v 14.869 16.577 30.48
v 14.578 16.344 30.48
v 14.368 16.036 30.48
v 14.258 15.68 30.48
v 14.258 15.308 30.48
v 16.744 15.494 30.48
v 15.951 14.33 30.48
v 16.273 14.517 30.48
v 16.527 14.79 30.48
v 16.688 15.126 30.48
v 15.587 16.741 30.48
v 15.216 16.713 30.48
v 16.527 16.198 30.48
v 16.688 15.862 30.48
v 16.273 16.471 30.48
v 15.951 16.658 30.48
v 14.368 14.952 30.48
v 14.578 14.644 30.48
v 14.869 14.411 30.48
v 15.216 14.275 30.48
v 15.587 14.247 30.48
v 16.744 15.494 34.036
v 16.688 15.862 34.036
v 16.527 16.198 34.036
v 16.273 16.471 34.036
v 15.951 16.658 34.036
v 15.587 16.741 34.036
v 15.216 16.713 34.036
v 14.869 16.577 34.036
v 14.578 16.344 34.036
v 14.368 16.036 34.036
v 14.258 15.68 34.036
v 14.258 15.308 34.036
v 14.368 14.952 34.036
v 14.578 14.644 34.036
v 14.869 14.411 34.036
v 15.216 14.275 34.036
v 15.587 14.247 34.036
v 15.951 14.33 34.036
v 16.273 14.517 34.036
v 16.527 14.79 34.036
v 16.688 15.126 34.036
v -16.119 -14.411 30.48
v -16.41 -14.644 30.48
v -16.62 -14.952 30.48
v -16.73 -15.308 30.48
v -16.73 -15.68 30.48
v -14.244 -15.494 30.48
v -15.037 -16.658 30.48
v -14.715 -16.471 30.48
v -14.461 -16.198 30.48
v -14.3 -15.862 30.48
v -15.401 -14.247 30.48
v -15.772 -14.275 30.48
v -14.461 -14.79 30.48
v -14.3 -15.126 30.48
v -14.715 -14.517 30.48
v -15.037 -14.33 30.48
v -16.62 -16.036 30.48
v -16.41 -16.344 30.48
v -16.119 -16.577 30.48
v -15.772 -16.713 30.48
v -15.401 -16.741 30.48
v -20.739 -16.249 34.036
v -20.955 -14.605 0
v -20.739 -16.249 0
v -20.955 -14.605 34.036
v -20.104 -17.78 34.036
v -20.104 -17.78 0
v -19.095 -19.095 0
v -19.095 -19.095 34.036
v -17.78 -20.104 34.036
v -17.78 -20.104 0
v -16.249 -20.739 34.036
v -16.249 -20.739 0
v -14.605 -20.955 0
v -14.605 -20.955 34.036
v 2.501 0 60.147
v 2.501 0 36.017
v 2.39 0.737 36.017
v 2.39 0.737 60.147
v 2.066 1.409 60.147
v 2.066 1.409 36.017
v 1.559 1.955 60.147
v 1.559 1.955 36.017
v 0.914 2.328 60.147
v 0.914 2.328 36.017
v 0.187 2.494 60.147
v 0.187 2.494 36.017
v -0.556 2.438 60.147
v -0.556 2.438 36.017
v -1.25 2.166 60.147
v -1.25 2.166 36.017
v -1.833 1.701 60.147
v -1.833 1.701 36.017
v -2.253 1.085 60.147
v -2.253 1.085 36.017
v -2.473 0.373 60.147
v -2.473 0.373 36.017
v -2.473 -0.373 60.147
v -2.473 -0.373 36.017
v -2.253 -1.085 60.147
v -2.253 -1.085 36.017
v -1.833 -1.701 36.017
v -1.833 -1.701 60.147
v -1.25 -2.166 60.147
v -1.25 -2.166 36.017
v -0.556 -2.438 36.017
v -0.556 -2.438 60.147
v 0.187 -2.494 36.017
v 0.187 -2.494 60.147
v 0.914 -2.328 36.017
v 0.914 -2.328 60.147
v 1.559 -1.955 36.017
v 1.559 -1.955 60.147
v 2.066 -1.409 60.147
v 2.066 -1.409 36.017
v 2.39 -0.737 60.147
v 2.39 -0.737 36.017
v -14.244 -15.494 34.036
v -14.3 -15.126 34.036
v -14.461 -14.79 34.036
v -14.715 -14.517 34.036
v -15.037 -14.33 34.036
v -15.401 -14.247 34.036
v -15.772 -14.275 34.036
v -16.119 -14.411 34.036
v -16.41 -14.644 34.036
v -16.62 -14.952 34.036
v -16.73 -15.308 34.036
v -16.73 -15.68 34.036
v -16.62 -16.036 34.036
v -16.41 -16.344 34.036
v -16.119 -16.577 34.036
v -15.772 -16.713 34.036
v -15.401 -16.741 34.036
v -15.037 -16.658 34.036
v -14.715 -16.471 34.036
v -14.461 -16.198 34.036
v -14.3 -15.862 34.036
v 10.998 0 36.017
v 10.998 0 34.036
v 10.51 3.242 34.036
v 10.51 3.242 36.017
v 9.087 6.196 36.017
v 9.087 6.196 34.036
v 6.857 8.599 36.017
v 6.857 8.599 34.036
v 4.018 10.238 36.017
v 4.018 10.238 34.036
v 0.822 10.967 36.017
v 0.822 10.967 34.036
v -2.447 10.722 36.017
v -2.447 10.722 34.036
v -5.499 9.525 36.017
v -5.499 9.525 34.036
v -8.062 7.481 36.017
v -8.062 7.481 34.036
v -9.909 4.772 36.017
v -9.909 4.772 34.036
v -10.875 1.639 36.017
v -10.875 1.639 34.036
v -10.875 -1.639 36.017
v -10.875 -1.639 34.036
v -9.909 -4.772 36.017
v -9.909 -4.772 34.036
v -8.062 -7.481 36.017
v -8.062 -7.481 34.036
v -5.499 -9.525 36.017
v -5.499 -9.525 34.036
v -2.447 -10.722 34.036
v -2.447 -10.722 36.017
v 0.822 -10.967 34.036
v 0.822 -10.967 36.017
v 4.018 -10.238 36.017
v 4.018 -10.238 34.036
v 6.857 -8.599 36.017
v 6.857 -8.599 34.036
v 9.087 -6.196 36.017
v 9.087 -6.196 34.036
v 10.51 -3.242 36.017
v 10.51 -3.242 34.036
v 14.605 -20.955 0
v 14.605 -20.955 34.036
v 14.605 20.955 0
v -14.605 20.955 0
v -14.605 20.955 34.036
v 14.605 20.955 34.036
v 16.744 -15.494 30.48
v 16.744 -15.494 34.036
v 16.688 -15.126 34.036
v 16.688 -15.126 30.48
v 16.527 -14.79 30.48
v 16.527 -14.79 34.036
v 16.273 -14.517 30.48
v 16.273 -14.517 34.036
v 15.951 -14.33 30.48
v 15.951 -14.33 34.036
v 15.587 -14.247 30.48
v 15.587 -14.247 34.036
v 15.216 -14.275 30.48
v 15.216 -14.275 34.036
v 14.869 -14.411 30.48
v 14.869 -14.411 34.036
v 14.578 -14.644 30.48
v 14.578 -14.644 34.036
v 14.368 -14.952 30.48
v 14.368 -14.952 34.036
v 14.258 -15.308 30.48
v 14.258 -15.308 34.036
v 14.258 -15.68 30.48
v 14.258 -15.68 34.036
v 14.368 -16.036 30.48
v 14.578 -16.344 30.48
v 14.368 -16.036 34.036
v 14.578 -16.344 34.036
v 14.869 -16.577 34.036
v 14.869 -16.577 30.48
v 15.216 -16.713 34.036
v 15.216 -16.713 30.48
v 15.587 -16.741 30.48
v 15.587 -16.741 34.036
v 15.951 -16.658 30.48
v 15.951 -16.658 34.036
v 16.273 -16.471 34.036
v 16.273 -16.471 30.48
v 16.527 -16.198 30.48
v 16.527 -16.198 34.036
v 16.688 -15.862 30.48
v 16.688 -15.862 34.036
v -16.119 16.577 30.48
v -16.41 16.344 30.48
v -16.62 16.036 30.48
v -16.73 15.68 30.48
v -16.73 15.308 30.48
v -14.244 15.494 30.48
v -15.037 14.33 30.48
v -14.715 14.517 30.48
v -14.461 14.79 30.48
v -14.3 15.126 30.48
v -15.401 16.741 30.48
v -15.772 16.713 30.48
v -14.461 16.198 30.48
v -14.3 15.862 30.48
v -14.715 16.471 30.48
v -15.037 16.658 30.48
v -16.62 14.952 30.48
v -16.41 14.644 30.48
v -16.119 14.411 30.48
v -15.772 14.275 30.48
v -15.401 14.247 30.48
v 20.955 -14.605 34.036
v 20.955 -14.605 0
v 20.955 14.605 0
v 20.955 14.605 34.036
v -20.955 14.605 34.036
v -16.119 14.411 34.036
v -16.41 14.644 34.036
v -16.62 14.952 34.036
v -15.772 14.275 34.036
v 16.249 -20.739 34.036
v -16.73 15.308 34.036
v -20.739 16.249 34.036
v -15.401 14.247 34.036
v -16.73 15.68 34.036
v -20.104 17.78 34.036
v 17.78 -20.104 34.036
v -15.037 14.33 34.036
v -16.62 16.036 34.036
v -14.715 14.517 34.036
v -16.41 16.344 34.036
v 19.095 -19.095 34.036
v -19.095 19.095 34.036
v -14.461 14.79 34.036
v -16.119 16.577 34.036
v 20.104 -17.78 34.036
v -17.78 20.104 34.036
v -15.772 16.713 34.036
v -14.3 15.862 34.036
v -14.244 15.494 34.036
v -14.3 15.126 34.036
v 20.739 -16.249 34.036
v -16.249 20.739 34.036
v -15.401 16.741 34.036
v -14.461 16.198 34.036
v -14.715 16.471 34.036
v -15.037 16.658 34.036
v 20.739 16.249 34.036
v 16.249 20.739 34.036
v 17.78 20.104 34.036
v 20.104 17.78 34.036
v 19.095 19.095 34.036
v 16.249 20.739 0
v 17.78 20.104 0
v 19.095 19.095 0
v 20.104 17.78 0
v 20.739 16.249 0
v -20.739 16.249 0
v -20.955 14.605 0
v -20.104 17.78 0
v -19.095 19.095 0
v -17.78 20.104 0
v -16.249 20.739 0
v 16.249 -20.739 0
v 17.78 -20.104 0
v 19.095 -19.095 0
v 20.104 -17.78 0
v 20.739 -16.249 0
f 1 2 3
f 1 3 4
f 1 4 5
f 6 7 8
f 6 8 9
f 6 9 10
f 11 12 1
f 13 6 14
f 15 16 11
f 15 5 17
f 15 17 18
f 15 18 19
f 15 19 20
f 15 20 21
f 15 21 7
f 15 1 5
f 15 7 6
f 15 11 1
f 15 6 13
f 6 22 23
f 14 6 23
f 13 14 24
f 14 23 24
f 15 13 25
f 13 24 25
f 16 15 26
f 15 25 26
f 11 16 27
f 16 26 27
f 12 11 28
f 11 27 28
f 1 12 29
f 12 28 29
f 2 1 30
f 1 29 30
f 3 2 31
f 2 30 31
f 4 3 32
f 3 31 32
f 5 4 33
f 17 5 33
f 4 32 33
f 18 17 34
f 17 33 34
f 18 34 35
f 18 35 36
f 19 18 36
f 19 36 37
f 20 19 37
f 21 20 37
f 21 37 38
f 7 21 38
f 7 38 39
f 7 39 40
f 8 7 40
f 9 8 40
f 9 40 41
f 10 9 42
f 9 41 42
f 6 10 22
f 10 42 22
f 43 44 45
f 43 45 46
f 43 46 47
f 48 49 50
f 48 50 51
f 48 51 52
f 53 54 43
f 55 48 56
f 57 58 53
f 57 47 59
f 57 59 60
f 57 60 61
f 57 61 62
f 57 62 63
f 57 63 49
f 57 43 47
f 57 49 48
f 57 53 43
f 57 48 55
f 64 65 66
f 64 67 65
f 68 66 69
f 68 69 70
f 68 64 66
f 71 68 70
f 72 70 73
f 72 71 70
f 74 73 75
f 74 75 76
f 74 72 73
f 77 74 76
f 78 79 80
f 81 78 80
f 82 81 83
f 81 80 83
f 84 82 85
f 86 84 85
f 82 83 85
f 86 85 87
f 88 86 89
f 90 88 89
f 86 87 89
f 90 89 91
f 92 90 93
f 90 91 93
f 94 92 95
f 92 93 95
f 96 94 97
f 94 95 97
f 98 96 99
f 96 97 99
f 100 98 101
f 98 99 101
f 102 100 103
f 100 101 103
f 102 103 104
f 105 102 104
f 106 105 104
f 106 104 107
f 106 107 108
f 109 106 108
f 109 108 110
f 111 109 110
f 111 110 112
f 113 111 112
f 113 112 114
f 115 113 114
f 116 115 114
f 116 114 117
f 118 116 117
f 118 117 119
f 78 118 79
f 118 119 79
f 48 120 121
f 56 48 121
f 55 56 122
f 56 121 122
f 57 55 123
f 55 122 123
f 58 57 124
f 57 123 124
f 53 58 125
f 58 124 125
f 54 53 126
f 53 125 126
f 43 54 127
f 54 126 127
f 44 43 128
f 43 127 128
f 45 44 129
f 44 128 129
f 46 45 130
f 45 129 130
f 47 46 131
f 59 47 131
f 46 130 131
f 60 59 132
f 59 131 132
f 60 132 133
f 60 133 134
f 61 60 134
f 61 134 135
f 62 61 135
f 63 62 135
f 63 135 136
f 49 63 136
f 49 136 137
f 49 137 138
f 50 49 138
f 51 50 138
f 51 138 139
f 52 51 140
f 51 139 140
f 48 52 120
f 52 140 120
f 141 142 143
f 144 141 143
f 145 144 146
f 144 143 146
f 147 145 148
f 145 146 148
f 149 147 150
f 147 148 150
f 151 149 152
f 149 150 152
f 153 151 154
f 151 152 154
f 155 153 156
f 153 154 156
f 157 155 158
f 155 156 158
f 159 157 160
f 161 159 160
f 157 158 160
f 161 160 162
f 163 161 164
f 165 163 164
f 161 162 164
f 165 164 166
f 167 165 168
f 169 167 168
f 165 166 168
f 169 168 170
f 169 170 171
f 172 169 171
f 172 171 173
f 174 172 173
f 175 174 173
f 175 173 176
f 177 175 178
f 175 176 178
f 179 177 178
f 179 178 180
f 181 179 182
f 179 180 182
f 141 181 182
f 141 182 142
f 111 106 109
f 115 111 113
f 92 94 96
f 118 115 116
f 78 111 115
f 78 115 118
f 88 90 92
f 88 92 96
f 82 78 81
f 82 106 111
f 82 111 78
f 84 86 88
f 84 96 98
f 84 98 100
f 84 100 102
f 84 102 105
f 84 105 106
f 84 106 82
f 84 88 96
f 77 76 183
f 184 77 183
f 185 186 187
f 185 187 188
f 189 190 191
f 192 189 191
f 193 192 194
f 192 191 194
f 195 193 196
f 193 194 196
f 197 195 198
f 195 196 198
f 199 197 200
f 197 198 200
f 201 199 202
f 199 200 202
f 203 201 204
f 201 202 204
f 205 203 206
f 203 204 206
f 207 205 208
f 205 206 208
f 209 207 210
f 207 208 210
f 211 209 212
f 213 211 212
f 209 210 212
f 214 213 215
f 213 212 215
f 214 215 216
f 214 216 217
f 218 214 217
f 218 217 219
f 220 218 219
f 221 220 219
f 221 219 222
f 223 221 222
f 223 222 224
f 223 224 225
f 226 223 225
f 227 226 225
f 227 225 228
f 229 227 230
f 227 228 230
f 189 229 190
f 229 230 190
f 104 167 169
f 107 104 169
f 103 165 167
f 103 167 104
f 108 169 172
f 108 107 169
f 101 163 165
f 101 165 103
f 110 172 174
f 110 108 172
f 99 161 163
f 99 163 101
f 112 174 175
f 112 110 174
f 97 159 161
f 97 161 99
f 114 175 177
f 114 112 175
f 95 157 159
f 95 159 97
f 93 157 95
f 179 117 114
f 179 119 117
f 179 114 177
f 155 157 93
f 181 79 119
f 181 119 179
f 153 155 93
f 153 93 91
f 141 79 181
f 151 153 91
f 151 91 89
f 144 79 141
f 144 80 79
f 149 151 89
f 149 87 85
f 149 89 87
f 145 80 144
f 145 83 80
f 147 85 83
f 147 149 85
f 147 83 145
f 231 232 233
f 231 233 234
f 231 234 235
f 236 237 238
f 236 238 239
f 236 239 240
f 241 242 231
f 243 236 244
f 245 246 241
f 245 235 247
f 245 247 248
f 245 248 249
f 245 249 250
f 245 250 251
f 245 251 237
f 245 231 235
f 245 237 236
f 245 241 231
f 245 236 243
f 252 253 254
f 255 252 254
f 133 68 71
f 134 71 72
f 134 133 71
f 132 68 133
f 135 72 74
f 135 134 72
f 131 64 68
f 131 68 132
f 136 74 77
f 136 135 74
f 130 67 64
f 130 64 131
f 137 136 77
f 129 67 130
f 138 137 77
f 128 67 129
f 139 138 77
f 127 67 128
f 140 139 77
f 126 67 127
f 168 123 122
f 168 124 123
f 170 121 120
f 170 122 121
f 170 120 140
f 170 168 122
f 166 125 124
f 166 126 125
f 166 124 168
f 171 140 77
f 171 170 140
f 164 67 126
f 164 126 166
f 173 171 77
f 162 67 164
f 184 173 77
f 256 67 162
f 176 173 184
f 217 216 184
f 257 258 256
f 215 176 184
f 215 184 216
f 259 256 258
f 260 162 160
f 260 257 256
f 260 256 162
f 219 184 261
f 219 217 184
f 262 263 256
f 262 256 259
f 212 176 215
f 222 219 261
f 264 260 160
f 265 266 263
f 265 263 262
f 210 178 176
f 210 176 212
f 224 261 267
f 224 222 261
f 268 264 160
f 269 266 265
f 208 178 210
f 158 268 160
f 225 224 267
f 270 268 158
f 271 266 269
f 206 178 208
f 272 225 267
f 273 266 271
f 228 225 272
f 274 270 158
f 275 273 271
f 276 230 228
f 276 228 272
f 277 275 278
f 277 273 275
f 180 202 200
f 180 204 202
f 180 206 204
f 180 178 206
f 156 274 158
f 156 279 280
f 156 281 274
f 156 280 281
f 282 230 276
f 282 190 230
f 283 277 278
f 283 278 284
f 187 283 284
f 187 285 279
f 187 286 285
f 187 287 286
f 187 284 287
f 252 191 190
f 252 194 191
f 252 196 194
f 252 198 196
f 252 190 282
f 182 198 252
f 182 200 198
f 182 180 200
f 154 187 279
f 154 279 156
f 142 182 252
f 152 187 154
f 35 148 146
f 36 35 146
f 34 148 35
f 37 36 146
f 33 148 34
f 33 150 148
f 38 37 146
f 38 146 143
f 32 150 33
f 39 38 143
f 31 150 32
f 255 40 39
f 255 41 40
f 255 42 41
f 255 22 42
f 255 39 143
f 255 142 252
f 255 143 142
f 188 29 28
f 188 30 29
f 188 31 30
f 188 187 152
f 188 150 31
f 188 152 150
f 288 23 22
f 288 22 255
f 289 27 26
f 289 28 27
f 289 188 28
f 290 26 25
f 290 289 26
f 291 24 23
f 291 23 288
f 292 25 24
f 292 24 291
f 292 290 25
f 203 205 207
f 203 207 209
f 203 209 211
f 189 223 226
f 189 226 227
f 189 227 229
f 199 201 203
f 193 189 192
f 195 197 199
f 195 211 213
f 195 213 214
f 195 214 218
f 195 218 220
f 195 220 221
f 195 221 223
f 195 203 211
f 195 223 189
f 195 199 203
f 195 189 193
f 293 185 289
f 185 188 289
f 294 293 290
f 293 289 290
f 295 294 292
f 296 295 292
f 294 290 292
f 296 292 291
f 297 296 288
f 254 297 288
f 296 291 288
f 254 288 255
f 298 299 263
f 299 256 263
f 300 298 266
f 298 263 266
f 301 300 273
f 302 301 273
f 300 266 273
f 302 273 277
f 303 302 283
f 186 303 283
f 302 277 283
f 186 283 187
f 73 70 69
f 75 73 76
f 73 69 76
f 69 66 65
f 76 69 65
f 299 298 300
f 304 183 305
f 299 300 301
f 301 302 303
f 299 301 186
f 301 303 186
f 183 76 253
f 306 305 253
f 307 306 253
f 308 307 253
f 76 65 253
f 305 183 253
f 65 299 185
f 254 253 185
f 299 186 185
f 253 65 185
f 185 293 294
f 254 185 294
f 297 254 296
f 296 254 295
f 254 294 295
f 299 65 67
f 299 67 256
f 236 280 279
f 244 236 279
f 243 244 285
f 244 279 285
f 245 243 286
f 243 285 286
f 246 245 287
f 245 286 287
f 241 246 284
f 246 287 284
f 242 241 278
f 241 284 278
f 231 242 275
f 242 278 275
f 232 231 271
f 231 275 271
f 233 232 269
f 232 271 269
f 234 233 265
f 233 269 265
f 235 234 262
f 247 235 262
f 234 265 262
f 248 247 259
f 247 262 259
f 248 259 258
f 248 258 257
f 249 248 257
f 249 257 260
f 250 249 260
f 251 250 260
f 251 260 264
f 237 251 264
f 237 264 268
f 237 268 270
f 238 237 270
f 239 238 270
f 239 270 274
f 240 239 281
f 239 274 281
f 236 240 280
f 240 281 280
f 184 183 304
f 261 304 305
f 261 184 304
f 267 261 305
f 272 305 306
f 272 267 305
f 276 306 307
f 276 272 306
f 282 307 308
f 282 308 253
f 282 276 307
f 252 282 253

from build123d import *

# Parameters (mm, degrees)
F0_W     = 41.91
F0_H     = 41.91
F1_DEPTH = 34.036
F2_R     = 1.25
F3_DEPTH = 3.556
F4_R     = 6.35
F5_R     = 10.9982
F6_DEPTH = 1.9812
F7_R     = 2.50063
F8_DEPTH = 24.13


with BuildPart() as f1:
    # F0 (on Top) → F1 (new body)
    with BuildSketch(Plane.XY):
        Rectangle(F0_W, F0_H)
    extrude(amount=F1_DEPTH)

    # F2 (on face) → F3 (cut)
    with BuildSketch(Plane.XY.offset(34.036)):
        with Locations((15.494, -15.494)):
            Circle(F2_R)
        with Locations((15.494, 15.494)):
            Circle(F2_R)
        with Locations((-15.494, 15.494)):
            Circle(F2_R)
        with Locations((-15.494, -15.494)):
            Circle(F2_R)
    extrude(amount=-F3_DEPTH, mode=Mode.SUBTRACT)

    # F4
    f4_edges = [f1.edges().sort_by_distance(p)[0] for p in [
        (-20.955, -20.955, 17.018),
        (20.955, -20.955, 17.018),
        (20.955, 20.955, 17.018),
        (-20.955, 20.955, 17.018),
    ]]
    fillet(f4_edges, radius=F4_R)

    # F5 (on face) → F6 (join)
    with BuildSketch(Plane.XY.offset(34.036)):
        Circle(F5_R)
    extrude(amount=F6_DEPTH)

    # F7 (on face) → F8 (join)
    with BuildSketch(Plane.XY.offset(36.0172)):
        Circle(F7_R)
    extrude(amount=F8_DEPTH)


solid = f1.part
